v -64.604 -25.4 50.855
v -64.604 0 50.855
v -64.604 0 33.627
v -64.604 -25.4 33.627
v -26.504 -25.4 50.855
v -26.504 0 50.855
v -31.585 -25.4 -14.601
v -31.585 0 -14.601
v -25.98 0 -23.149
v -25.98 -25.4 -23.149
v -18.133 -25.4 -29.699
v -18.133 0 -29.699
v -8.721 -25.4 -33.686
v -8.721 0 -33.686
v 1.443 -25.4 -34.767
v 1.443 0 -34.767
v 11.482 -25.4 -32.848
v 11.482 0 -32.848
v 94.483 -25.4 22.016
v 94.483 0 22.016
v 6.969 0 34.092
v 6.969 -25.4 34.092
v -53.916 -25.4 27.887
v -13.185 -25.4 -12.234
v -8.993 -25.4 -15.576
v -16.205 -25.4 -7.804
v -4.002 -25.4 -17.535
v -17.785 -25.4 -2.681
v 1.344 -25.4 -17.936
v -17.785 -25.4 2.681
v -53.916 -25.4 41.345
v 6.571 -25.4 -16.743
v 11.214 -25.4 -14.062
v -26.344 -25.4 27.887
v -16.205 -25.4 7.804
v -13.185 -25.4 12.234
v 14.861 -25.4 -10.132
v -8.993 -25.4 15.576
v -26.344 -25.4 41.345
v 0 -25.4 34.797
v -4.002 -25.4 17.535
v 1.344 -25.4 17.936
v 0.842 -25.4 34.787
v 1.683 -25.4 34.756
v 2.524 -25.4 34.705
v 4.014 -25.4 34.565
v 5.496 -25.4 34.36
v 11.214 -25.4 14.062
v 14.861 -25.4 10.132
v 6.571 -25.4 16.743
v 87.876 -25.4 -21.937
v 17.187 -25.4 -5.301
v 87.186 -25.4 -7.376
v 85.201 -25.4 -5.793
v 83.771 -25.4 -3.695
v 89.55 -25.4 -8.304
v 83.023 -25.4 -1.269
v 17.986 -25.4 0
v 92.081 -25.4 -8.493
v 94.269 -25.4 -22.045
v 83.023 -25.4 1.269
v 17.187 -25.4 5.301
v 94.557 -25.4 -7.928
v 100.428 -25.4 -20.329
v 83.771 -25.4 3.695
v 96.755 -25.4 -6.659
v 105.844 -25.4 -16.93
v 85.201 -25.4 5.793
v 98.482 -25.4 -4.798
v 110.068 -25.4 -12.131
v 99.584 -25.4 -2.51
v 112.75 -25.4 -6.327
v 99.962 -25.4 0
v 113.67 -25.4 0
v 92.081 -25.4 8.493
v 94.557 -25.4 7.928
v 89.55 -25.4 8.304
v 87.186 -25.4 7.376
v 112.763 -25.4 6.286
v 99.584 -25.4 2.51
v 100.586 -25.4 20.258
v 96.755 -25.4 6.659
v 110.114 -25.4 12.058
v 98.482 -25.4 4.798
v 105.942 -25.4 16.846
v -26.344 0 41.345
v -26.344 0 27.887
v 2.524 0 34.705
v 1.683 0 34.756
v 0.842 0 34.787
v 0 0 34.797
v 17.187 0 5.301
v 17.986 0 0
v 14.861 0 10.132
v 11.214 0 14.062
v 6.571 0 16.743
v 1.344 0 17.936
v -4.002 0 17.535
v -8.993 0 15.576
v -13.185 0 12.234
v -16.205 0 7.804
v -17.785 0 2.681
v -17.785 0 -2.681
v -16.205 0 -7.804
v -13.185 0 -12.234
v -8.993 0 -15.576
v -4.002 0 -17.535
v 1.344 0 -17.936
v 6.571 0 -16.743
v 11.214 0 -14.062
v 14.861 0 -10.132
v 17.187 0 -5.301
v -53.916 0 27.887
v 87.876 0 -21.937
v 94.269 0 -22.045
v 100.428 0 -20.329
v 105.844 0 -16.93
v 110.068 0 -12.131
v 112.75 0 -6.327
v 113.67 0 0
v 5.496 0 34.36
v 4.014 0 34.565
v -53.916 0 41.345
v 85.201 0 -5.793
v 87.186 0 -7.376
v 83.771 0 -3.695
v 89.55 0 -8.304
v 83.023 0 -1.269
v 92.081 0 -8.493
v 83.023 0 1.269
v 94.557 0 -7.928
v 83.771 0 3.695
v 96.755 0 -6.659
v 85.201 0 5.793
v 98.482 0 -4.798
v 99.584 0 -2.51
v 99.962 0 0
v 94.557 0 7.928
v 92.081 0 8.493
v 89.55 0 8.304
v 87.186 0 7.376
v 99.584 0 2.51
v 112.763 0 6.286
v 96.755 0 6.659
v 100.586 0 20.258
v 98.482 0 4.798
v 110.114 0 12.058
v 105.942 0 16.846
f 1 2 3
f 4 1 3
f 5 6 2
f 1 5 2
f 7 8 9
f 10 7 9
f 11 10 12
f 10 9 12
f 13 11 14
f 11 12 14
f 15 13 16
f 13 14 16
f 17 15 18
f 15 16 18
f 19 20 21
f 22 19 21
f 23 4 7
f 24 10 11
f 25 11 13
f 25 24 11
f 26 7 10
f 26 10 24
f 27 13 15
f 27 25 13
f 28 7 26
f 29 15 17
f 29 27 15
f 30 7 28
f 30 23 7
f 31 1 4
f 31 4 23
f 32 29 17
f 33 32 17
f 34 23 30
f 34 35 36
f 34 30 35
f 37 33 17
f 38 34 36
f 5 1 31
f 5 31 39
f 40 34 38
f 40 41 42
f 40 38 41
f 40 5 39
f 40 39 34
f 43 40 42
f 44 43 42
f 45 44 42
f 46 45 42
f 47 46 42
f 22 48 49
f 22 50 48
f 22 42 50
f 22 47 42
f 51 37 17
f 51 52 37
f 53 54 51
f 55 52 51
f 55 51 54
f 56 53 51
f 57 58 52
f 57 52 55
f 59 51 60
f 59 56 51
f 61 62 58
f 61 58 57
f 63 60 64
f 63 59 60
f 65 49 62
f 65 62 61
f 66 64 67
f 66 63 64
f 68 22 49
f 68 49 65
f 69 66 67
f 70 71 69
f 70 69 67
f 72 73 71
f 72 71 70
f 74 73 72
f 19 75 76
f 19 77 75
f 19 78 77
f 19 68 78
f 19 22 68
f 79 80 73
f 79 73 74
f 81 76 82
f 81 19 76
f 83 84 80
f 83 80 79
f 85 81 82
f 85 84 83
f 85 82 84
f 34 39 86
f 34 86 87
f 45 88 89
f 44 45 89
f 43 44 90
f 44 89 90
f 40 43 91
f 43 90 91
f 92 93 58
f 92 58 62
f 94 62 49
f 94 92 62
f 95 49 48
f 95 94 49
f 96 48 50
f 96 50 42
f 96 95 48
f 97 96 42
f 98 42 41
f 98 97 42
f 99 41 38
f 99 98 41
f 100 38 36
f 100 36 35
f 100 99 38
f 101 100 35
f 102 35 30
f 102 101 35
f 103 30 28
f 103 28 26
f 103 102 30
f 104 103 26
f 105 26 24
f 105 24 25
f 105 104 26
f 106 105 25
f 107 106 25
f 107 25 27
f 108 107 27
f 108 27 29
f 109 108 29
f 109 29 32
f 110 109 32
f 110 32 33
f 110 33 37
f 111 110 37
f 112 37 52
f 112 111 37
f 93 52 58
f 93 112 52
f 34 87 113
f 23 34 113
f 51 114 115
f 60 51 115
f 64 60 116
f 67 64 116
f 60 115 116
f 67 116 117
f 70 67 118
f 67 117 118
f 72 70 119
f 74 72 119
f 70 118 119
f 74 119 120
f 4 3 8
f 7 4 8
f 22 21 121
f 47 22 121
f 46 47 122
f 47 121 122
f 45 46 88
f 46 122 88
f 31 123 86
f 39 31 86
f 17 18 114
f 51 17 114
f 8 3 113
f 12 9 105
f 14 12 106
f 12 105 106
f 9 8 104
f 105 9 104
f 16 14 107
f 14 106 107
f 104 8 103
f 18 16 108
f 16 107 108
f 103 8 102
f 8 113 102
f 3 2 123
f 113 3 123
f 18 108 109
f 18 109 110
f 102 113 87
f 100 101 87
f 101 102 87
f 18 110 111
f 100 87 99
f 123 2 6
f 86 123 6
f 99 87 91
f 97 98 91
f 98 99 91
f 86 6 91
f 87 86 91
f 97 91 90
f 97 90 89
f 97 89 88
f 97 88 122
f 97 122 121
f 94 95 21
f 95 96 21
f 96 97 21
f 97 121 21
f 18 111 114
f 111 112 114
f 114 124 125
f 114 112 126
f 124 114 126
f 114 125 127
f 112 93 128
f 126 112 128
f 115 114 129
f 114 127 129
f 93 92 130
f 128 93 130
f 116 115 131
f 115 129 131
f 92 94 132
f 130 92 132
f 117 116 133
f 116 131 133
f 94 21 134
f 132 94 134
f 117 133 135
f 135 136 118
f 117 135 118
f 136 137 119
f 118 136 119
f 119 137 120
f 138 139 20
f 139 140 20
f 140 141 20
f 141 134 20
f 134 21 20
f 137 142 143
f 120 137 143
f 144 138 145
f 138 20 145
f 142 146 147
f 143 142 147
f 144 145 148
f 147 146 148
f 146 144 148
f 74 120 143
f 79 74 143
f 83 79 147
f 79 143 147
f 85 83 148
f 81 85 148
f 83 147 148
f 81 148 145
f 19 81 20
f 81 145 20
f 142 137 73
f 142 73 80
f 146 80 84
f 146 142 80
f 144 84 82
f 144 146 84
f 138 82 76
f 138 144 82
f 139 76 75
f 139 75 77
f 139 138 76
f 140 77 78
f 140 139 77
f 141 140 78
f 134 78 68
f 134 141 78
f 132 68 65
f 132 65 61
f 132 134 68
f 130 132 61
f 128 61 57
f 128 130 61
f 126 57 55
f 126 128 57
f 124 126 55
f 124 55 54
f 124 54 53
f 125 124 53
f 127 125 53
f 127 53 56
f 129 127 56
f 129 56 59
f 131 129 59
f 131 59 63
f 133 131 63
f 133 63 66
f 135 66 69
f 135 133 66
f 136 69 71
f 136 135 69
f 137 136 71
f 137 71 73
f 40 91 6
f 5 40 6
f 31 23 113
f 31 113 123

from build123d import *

# Parameters (mm, degrees)
F0_R     = 17.986048
F0_R_2   = 8.517219
F1_DEPTH = 25.4


with BuildPart() as f1:
    # F0 (on Front) → F1 (new body)
    with BuildSketch(Plane.XZ):
        with BuildLine():
            Line((6.968918, 34.091828), (2.523895, 34.705166))
            ThreePointArc((2.523895, 34.705166), (1.262779, 34.773898), (0, 34.796818))
            ThreePointArc((0, 34.796818), (-29.316392, 18.744805), (-31.585075, -14.601425))
            ThreePointArc((-31.585075, -14.601425), (-13.574429, -32.039873), (11.482109, -32.847827))
            ThreePointArc((11.482109, -32.847827), (28.375689, -20.140478), (34.796818, 0))
            ThreePointArc((34.796818, 0), (26.956583, 22.003663), (6.968918, 34.091828))
        make_face()
        Circle(F0_R, mode=Mode.SUBTRACT)
        with BuildLine():
            ThreePointArc((6.968918, 34.091828), (4.756303, 34.470221), (2.523895, 34.705166))
            Line((2.523895, 34.705166), (6.968918, 34.091828))
        make_face()
        Polygon((-26.343811, 34.796818), (0, 34.796818), (-26.504347, 50.855222), (-26.504347, 41.345175), (-26.343811, 41.345175), align=None)
        with BuildLine():
            ThreePointArc((-31.585075, -14.601425), (-29.316392, 18.744805), (0, 34.796818))
            Line((0, 34.796818), (-26.343811, 34.796818))
            Line((-26.343811, 34.796818), (-26.343811, 27.887493))
            Line((-26.343811, 27.887493), (-53.915653, 27.887493))
            Line((-53.915653, 27.887493), (-53.915653, 33.627392))
            Line((-53.915653, 33.627392), (-64.604347, 33.627392))
            Line((-64.604347, 33.627392), (-31.585075, -14.601425))
        make_face()
        with BuildLine():
            Line((94.482827, 22.0164), (6.968918, 34.091828))
            ThreePointArc((6.968918, 34.091828), (26.956583, 22.003663), (34.796818, 0))
            ThreePointArc((34.796818, 0), (28.375689, -20.140478), (11.482109, -32.847827))
            Line((11.482109, -32.847827), (87.876434, -21.936645))
            ThreePointArc((87.876434, -21.936645), (69.466815, 3.303437), (94.482827, 22.0164))
        make_face()
        Polygon((-26.504347, 41.345175), (-26.504347, 50.855222), (-64.604347, 50.855222), (-64.604347, 33.627392), (-53.915653, 33.627392), (-53.915653, 41.345175), align=None)
        with BuildLine():
            ThreePointArc((113.669939, 0), (108.200053, 14.601944), (94.482827, 22.0164))
            ThreePointArc((94.482827, 22.0164), (69.466815, 3.303437), (87.876434, -21.936645))
            ThreePointArc((87.876434, -21.936645), (105.843561, -16.93016), (113.669939, 0))
        make_face()
        with Locations((91.444939, 0)):
            Circle(F0_R_2, mode=Mode.SUBTRACT)
    extrude(amount=F1_DEPTH)


solid = f1.part
